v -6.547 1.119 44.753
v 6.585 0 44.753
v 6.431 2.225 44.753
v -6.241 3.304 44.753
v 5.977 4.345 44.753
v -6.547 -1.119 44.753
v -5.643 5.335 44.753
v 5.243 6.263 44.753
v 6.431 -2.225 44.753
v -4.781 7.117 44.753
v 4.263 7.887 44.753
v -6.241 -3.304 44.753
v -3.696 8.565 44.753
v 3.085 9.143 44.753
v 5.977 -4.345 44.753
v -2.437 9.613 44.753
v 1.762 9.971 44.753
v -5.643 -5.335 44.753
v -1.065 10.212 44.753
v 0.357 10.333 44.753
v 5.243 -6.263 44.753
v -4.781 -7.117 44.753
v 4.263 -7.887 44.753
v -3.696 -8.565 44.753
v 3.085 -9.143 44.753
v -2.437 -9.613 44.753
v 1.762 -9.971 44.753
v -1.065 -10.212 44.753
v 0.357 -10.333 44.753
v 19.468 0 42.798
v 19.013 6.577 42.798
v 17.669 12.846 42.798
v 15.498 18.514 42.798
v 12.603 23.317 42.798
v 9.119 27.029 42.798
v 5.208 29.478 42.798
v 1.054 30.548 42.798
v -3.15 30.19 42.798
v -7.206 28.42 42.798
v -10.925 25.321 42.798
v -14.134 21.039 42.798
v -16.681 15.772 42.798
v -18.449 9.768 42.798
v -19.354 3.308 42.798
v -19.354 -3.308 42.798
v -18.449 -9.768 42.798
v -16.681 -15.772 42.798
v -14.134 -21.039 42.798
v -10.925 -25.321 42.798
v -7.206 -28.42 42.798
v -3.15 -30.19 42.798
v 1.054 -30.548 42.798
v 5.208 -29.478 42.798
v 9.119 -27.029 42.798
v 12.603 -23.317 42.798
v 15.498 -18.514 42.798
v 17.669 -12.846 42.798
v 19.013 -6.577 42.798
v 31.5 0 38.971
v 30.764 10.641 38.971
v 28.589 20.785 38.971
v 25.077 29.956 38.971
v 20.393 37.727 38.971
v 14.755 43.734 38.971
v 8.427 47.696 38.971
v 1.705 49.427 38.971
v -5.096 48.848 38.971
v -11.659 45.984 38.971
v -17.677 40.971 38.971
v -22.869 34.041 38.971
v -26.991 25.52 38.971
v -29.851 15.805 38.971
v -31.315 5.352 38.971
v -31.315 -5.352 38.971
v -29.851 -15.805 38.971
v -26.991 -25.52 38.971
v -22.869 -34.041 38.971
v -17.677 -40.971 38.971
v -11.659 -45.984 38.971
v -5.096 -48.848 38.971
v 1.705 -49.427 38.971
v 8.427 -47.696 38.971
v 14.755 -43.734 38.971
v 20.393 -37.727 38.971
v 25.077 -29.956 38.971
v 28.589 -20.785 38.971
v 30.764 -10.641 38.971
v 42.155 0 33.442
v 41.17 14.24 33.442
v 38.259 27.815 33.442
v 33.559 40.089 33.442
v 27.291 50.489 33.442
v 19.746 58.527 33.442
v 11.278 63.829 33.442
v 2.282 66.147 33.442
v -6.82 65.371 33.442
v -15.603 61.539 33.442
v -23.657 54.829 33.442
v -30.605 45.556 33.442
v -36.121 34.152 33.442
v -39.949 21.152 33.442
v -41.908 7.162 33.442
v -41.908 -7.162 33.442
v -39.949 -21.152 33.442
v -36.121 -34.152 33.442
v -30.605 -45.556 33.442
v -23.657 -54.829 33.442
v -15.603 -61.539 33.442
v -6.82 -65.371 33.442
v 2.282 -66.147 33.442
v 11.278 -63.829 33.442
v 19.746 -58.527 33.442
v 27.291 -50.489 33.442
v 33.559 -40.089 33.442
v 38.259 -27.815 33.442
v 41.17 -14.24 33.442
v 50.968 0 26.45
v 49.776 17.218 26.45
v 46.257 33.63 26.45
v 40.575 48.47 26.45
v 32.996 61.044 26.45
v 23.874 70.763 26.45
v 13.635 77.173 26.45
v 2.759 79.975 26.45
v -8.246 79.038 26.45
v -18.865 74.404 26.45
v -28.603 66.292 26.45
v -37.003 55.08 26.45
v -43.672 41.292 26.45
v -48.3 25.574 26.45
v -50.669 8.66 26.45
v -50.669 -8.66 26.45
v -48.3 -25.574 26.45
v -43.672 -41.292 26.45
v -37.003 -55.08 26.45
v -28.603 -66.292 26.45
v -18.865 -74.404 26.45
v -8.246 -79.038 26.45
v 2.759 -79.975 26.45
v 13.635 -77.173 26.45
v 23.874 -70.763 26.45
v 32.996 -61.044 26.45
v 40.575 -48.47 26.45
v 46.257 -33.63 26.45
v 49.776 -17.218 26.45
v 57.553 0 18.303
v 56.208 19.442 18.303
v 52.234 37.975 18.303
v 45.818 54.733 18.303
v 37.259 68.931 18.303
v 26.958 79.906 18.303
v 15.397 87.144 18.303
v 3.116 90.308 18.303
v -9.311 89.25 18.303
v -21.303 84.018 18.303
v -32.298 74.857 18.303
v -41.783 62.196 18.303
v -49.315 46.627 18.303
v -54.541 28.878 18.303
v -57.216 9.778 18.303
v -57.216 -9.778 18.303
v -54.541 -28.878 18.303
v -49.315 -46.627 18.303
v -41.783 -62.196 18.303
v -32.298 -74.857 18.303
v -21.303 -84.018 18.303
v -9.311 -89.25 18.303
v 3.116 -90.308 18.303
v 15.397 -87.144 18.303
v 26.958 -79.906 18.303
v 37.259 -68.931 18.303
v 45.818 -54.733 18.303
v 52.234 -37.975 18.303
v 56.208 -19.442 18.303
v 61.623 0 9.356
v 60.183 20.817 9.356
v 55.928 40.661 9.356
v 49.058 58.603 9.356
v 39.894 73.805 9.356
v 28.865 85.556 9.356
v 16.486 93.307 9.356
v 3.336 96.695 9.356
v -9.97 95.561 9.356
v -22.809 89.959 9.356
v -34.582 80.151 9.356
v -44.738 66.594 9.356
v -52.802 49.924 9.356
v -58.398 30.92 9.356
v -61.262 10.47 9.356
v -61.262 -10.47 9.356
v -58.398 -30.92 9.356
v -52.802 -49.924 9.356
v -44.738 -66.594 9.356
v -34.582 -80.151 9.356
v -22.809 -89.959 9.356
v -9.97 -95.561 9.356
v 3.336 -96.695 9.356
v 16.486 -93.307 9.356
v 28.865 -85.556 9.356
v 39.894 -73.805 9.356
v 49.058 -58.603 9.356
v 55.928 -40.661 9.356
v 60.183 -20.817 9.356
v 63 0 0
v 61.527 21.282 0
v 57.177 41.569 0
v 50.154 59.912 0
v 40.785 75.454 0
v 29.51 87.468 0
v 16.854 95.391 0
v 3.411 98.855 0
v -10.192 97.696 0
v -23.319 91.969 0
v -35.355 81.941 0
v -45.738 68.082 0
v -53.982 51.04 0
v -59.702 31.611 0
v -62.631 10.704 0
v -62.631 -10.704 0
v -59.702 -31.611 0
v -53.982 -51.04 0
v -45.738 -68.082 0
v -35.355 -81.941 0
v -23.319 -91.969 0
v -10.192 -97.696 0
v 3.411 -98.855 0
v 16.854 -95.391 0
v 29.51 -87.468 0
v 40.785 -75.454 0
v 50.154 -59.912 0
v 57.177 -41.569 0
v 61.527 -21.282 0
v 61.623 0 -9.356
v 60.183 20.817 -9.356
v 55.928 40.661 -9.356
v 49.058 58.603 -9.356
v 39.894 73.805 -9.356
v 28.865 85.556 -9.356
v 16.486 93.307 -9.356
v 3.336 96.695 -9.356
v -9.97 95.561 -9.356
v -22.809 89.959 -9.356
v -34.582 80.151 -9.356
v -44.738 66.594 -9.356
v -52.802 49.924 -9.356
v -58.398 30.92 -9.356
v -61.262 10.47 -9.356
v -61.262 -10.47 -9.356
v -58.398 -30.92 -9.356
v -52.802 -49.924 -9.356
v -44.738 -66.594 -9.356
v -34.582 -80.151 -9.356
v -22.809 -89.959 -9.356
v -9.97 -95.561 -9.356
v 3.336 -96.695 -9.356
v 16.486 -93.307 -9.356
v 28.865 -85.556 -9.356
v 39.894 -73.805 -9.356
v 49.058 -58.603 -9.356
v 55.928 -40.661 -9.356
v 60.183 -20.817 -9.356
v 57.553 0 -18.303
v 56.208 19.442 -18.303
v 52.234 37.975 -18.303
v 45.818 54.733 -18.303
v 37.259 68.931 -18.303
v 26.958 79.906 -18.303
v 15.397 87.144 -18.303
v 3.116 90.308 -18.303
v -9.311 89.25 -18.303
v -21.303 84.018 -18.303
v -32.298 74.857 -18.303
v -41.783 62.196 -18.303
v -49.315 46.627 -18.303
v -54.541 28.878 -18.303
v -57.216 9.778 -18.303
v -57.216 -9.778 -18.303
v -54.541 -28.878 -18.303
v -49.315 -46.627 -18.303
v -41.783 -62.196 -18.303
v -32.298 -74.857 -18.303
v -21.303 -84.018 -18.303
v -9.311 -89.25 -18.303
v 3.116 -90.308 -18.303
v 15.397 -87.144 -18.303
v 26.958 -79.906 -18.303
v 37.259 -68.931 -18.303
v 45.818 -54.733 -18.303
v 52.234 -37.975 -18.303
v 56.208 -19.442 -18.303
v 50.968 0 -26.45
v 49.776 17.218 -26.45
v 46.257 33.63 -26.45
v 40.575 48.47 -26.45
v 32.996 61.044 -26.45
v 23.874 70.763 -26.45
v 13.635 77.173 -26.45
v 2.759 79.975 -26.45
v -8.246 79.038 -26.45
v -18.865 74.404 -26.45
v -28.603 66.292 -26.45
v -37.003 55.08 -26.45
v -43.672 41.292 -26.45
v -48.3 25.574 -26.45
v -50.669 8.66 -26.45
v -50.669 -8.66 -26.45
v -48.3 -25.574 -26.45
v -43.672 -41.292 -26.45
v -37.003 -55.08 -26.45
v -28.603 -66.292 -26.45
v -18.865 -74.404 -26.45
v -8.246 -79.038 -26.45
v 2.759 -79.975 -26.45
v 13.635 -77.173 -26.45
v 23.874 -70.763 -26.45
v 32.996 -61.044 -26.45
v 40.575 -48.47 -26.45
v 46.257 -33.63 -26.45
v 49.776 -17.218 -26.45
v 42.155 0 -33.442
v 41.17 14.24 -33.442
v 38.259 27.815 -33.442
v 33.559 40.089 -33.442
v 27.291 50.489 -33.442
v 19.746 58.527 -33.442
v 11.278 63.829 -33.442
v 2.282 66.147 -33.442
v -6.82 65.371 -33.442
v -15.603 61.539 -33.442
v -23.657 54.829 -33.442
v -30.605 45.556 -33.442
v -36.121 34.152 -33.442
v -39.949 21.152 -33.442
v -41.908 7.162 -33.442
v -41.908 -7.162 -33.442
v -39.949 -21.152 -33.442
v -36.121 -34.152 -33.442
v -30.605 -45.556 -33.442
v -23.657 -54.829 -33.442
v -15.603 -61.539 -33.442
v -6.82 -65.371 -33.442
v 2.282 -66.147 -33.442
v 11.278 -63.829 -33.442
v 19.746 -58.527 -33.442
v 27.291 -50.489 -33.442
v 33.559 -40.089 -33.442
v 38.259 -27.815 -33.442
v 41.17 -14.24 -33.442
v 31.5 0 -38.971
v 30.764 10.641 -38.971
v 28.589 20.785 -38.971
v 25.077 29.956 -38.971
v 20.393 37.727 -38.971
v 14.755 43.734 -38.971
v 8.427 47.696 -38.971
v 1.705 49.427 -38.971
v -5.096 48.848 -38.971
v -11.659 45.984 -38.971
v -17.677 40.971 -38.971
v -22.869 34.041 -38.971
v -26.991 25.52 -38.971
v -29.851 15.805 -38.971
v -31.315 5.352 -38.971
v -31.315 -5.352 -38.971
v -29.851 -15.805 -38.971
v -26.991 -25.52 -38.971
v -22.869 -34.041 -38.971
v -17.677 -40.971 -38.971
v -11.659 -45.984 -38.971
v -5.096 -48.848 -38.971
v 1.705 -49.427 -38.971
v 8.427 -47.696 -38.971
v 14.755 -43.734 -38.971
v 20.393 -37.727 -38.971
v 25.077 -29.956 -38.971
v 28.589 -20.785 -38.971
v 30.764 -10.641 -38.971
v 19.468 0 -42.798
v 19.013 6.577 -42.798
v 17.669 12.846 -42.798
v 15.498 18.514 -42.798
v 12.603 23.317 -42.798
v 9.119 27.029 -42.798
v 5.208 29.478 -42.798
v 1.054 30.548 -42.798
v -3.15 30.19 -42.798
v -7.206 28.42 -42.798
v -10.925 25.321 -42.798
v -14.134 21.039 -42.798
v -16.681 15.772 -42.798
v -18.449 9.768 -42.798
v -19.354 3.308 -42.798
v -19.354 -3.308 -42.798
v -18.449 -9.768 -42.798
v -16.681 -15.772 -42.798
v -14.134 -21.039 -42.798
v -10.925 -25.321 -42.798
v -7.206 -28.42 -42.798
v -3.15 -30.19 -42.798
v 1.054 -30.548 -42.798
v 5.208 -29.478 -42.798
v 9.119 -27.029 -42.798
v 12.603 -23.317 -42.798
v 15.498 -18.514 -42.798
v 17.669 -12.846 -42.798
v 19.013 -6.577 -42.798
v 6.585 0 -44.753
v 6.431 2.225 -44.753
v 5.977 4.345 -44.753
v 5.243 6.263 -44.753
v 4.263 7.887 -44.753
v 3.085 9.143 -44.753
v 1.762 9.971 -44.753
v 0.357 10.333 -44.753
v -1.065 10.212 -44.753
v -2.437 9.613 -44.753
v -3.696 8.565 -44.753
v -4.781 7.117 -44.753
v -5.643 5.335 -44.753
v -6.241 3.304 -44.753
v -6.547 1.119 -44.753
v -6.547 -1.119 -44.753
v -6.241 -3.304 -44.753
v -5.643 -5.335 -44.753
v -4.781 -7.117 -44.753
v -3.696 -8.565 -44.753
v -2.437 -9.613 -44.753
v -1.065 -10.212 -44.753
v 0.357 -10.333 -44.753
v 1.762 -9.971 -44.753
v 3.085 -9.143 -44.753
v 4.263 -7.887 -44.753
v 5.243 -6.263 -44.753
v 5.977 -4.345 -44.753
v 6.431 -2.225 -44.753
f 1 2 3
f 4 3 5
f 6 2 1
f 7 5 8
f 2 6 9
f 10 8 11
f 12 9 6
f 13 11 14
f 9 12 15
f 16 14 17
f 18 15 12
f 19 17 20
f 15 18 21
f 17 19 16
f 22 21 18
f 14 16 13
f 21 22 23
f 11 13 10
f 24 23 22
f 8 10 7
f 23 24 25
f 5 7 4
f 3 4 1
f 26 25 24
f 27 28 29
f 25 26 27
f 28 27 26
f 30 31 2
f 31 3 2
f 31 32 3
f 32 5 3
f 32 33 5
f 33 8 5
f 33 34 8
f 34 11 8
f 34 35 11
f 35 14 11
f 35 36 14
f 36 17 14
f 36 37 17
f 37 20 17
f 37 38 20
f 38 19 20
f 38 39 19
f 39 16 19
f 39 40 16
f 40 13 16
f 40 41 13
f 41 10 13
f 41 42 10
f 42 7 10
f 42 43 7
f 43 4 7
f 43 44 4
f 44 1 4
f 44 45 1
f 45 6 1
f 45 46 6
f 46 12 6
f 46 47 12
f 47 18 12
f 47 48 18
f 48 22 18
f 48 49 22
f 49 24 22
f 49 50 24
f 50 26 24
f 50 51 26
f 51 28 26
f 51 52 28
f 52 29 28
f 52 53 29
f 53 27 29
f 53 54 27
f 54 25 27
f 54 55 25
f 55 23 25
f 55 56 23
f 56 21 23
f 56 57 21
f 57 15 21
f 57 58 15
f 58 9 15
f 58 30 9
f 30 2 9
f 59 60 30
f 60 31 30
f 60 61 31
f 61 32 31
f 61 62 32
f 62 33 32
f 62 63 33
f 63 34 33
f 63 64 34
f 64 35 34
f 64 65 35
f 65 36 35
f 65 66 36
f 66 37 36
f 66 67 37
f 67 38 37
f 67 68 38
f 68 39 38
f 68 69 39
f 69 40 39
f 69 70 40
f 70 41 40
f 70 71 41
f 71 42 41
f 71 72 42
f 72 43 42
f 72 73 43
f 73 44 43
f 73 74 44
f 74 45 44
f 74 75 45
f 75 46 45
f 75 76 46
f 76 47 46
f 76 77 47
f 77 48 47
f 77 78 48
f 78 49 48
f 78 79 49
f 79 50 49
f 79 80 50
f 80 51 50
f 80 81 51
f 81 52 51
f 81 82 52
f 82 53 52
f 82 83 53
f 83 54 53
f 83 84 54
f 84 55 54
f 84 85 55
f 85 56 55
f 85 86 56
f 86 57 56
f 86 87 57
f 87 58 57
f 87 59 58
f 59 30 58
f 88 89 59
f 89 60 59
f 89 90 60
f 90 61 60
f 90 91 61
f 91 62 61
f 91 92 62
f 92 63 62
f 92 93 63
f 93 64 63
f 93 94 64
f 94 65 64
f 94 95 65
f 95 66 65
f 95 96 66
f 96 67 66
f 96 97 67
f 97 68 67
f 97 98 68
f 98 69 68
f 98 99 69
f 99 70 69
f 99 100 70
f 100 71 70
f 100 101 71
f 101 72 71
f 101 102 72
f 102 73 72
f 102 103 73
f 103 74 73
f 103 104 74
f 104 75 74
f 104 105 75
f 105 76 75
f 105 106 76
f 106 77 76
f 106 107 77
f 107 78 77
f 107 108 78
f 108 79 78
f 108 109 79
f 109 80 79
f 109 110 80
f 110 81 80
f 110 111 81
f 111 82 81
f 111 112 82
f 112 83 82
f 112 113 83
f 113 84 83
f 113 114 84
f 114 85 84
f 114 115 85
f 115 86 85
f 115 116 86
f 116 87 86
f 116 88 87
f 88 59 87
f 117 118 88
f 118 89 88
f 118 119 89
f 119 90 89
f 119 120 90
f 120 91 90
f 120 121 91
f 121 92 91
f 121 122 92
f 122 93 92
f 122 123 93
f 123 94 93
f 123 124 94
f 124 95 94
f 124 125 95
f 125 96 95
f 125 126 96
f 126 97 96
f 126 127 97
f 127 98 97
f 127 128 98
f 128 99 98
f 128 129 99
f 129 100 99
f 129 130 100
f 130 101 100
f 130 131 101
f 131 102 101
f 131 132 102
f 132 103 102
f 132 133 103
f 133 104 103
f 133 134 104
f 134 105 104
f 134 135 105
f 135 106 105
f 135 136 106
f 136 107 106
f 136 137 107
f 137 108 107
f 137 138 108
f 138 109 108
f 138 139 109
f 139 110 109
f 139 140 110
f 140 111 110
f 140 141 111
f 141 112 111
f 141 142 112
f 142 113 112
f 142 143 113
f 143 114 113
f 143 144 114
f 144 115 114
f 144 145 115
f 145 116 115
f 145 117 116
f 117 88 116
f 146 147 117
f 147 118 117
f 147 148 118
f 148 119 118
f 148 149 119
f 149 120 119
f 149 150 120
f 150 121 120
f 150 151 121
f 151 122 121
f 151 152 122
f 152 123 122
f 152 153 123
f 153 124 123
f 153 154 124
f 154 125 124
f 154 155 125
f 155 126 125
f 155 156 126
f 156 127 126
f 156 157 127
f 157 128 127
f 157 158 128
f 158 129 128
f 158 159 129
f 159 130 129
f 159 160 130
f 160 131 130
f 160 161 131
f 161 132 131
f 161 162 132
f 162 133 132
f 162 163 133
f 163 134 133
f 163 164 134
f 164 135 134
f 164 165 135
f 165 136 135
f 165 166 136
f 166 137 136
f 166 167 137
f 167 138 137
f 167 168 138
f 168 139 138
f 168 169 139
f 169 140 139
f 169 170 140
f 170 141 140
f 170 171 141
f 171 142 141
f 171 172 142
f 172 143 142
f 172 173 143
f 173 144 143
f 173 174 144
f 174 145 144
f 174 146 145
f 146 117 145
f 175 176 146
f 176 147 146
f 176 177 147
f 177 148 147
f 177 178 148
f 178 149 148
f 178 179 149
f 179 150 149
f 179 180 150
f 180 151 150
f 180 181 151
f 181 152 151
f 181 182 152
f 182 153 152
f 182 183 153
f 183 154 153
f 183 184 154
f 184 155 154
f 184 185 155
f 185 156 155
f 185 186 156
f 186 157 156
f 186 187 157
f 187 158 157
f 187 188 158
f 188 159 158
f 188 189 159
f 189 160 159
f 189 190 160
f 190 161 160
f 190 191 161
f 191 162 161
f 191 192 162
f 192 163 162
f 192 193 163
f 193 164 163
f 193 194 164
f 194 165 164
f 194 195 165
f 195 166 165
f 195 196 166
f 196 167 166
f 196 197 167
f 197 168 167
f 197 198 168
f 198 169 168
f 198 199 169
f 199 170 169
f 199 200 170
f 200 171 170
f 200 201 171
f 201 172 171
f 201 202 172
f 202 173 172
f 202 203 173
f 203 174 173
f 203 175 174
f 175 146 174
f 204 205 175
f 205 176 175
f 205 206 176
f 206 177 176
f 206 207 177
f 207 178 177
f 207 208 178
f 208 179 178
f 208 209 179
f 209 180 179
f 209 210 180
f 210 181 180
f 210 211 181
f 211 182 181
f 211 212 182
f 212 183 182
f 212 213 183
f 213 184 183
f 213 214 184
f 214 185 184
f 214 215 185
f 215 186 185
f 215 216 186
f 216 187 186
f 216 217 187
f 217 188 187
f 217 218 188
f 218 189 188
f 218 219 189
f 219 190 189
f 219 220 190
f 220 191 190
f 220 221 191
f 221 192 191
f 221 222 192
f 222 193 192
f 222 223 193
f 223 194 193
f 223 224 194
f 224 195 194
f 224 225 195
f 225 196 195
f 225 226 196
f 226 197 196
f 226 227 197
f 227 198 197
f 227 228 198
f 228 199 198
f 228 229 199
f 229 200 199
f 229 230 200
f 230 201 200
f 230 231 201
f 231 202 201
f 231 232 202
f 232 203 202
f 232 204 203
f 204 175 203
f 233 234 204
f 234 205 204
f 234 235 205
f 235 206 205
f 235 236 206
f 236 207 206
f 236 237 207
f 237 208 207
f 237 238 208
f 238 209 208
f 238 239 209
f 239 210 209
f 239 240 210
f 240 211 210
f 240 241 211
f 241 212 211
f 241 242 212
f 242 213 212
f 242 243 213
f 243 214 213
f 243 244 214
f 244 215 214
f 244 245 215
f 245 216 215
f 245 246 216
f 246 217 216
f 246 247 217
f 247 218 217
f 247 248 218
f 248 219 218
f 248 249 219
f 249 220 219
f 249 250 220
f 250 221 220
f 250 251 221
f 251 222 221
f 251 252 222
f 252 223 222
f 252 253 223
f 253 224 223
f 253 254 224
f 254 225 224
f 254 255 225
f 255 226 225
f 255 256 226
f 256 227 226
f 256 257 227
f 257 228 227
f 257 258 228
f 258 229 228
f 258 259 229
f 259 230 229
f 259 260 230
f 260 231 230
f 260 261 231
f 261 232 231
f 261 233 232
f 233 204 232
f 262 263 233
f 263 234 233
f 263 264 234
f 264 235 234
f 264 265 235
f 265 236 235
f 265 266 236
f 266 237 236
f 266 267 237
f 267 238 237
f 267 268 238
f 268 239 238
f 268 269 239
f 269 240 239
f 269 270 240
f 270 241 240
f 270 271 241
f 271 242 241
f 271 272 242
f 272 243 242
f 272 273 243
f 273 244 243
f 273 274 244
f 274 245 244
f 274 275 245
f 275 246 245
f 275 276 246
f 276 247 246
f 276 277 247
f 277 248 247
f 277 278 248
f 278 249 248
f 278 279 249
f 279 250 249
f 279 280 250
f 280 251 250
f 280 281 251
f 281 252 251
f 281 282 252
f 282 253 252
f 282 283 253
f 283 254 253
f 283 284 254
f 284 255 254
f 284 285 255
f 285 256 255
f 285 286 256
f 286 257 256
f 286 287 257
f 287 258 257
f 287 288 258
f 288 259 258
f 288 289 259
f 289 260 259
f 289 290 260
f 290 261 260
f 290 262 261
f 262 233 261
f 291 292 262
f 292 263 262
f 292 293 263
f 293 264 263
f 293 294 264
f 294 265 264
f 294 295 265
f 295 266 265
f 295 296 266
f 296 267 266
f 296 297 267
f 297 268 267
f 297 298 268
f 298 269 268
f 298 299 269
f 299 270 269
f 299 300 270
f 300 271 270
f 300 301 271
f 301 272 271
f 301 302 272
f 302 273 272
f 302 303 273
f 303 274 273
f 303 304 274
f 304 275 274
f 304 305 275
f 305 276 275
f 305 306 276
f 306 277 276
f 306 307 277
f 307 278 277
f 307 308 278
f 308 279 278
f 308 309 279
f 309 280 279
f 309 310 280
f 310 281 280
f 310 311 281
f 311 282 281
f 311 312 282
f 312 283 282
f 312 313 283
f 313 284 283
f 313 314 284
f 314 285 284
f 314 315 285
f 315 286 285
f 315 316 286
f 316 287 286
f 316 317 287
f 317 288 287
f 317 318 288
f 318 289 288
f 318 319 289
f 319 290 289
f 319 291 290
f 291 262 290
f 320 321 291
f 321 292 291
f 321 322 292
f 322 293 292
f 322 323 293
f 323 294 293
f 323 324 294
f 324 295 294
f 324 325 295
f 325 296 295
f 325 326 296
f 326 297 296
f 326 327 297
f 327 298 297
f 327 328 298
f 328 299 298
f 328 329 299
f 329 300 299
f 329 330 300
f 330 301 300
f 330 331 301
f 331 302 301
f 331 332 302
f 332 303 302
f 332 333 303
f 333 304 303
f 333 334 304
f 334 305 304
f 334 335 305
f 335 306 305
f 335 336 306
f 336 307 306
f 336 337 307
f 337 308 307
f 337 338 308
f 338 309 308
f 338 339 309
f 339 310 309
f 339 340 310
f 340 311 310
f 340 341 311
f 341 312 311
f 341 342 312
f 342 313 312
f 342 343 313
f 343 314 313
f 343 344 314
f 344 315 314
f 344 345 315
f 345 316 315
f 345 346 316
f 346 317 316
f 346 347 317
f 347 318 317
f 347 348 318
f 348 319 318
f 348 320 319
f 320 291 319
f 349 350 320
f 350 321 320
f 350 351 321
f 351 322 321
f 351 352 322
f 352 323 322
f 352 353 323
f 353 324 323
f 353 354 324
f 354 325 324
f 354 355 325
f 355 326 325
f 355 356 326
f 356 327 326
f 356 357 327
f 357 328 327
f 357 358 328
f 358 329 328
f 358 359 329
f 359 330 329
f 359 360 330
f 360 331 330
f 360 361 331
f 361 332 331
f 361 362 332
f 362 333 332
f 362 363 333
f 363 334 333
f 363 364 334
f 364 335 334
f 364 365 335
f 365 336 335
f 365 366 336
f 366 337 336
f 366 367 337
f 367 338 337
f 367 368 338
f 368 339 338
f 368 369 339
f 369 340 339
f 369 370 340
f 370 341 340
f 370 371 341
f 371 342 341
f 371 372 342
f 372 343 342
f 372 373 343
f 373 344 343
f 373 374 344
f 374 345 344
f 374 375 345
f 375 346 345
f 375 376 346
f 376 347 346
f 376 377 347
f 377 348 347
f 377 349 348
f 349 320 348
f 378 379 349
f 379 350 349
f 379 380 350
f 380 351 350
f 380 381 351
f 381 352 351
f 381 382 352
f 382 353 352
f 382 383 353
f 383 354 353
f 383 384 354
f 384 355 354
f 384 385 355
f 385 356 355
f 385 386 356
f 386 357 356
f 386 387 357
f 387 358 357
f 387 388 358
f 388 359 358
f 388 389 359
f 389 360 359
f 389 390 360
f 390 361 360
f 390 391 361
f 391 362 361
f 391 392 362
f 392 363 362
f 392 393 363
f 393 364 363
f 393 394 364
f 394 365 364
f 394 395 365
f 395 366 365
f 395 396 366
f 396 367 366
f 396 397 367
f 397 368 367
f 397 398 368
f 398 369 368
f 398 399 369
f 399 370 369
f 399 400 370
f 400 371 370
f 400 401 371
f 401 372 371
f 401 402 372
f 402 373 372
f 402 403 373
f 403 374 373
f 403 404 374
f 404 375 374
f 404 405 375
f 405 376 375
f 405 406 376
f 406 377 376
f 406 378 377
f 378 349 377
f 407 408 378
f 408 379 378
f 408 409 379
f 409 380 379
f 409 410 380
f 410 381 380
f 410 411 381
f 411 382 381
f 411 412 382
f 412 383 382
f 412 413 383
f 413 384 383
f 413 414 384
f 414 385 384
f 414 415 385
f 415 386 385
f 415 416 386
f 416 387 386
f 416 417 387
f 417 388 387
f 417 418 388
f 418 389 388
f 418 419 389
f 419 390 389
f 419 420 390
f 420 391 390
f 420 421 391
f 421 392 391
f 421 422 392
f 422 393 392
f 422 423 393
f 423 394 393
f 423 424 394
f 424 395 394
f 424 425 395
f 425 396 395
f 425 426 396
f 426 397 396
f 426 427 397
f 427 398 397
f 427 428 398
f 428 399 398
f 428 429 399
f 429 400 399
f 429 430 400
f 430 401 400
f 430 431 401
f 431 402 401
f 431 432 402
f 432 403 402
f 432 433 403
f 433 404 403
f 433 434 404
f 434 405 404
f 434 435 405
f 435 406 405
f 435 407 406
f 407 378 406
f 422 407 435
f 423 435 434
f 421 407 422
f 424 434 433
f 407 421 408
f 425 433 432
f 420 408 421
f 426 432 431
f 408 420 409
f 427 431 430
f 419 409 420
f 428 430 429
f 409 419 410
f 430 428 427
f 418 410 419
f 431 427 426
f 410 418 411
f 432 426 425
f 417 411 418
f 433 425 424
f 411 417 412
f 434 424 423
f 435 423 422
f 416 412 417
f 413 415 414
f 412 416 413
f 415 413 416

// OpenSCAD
// Generated by SolidPython 1.0.1 on 2020-07-29 00:46:47


scale(v = [7, 11, 5]) {
	sphere(r = 9);
}
/***********************************************
*********      SolidPython code:      **********
************************************************
 
# import packages: SolidPython
from solid import *
from solid.utils import *
from itertools import chain, combinations, permutations


class Resize:

    def __init__(self, scad_file):
        self.scad_file = scad_file
        #self.scad_file = import_scad(scad_file)
        # cone/cylinder param:
        self.r1 = 0
        self.r2 = 0
        self.h = 0
        # rectangular prism param:
        self.w = 0
        self.l = 0
        # ellipse param:
        self.r = 0

    # import OpenScad code (file name corresponds to shape)


    # classify shape + parameters
    def assign(self, param1, param2, param3):
        if self.scad_file == 'cone.scad':
            self.r1 = param1
            self.r2 = param2
            self.h = param3
        elif self.scad_file == 'cylinder.scad':
            self.r1 = param1
            self.r2 = param2
            self.h = param3
        elif self.scad_file == 'rectangularPrism.scad':
            self.h = param1
            self.l = param2
            self.w = param3
        else:
            self.r = param1
            self.h = param2

    # resize parameters
    def iterate(self):
        x = range(3, 20, 2)
        i = 1
        if self.scad_file == 'cone.scad':
            tempList = list(permutations(x, 2))
            for temp in tempList:
                param1 = temp[0]
                param2 = temp[1]
                filepath = 'produced_scad_files/' + 'cone' + str(param1) + '_' + str(param2) + '_' + '.scad'
                scad_render_to_file(cylinder(h=param1, r1=param2, r2=0), filepath)

        elif self.scad_file == 'cylinder.scad':
            tempList = list(permutations(x, 3))
            for temp in tempList:
                param1 = temp[0]
                param2 = temp[1]
                filepath = 'produced_scad_files/' + 'cylinder' + str(param1) + '_' + str(param2) + '_' + '.scad'
                scad_render_to_file(cylinder(h=param1, r1=param2, r2=param2), filepath)

        elif self.scad_file == 'rectangularPrism.scad':
            tempList = list(permutations(x, 3))
            for temp in tempList:
                param1 = temp[0]
                param2 = temp[1]
                param3 = temp[2]
                filepath = 'produced_scad_files/' + 'rectangularPrism' + str(param1) + '_' + str(param2) + '_' + str(
                    param3) + '.scad'
                scad_render_to_file(cube(size=(param1, param2, param3)), filepath)

        elif self.scad_file == 'ellipse.scad':
            tempList = list(permutations(x, 4))
            for temp in tempList:
                param1 = temp[0]
                param2 = temp[1]
                param3 = temp[2]
                param4 = temp[3]
                filepath = 'produced_scad_files/' + 'ellipse' + str(param1) + '_' + str(param2) + '_' + str(param3) + '_' + str(param4) + '.scad'
                scad_render_to_file(scale([param1, param2, param3])(sphere(r=param4)), filepath)

    def render_to_scadfile(self):
        scad_render_to_file(scad, 'example.scad') 
 
************************************************/
